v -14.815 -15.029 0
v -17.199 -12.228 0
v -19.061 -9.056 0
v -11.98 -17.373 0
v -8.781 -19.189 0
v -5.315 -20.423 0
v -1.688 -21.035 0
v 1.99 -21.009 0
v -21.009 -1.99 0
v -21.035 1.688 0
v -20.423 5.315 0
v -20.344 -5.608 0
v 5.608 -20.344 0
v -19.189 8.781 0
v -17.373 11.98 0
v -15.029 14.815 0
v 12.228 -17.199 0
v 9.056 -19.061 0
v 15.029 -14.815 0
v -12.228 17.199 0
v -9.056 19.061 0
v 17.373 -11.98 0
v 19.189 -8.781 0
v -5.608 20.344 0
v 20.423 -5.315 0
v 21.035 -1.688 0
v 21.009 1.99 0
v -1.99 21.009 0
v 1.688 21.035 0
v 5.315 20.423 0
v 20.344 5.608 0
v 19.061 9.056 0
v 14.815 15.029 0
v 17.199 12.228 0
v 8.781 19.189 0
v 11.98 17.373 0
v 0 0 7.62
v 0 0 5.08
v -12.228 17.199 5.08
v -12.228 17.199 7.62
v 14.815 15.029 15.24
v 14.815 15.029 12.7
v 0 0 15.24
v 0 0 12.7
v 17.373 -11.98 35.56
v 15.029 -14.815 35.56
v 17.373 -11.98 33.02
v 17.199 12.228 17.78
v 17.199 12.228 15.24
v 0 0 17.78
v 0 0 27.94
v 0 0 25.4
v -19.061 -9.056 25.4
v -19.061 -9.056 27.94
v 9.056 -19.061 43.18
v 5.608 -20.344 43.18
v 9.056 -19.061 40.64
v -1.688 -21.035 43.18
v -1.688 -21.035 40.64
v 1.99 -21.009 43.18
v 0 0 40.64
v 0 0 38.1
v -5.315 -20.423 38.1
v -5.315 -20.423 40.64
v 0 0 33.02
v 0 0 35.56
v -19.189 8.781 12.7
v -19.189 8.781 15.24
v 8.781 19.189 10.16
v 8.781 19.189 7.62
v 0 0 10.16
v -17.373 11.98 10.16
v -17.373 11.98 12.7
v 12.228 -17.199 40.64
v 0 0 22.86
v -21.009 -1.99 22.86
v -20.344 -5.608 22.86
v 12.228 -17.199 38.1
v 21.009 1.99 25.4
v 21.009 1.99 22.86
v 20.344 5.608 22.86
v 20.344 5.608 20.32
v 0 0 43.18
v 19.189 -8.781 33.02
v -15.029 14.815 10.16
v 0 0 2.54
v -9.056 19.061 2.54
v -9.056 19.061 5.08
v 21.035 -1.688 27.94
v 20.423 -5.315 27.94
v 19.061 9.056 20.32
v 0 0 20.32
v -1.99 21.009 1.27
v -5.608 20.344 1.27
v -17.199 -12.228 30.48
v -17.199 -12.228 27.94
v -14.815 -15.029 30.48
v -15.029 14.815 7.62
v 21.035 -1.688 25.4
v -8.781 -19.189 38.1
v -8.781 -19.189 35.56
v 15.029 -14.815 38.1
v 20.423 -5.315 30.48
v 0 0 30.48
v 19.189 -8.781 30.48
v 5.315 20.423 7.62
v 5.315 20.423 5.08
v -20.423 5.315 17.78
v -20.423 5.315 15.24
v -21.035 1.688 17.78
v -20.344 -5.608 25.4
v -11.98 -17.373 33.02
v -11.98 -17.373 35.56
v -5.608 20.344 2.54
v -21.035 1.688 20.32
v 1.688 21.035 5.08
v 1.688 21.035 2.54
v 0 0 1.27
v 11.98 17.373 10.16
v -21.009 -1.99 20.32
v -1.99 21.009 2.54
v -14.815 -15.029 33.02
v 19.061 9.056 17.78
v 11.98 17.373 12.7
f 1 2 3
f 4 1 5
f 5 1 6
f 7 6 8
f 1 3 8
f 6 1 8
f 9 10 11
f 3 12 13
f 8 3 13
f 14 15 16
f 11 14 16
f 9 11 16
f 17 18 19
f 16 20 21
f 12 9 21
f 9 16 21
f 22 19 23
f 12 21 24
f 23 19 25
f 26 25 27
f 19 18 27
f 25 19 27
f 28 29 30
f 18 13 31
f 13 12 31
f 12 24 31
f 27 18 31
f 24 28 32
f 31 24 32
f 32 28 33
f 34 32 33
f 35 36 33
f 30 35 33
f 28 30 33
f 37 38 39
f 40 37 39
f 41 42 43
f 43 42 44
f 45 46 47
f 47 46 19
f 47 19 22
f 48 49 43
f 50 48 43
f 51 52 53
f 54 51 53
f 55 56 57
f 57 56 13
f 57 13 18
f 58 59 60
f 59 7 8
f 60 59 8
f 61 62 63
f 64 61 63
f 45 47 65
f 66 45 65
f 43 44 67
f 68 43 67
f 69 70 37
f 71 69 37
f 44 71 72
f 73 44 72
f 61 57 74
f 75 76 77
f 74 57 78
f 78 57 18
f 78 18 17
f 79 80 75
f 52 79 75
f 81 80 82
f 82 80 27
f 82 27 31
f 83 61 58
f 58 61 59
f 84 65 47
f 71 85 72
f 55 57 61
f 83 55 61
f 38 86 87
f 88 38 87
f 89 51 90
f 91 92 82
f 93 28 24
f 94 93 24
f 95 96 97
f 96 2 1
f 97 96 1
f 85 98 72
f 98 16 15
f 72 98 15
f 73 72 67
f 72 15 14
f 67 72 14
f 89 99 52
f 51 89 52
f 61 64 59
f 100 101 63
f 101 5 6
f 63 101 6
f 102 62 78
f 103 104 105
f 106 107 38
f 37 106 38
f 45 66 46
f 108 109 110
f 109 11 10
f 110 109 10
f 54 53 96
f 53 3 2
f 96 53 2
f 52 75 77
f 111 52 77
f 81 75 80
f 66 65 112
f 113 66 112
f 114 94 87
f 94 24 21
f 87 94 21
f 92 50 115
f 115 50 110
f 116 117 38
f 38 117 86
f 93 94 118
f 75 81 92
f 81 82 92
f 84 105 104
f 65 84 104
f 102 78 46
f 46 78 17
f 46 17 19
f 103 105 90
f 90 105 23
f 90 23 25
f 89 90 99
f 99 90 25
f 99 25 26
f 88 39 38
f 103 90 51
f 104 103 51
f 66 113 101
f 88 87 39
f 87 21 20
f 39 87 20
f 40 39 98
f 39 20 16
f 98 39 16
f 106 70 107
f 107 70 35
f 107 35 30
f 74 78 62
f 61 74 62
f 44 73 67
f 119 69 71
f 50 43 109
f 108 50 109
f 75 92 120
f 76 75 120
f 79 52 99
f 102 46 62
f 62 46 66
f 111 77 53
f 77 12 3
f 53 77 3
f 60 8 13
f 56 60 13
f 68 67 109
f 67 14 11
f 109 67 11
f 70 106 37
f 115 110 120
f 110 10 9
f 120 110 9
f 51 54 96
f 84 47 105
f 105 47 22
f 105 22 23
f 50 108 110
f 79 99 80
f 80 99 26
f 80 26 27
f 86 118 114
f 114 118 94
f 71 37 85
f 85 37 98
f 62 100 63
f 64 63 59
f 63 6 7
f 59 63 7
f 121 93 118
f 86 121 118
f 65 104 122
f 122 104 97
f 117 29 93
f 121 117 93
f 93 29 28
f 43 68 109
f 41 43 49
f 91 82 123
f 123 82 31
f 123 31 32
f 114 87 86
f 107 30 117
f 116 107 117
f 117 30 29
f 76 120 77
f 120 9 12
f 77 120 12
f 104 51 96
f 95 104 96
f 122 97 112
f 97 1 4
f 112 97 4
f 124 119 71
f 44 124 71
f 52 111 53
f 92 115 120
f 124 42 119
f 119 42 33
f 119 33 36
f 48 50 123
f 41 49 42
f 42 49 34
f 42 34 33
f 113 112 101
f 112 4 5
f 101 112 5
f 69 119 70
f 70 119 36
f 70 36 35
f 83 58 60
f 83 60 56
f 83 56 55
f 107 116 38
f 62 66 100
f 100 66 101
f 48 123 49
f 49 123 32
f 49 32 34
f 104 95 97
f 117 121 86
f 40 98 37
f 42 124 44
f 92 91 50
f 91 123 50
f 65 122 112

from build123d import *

# Parameters (mm, degrees)
F1_DEPTH  = 2.54
F2_DEPTH  = 5.08
F3_DEPTH  = 7.62
F4_DEPTH  = 10.16
F5_DEPTH  = 12.7
F6_DEPTH  = 15.24
F7_DEPTH  = 17.78
F8_DEPTH  = 20.32
F9_DEPTH  = 22.86
F10_DEPTH = 25.4
F11_DEPTH = 27.94
F12_DEPTH = 30.48
F13_DEPTH = 33.02
F14_DEPTH = 35.56
F15_DEPTH = 38.1
F16_DEPTH = 40.64
F17_DEPTH = 43.18
F18_DEPTH = 43.18
F19_DEPTH = 43.18
F20_DEPTH = 40.64
F21_DEPTH = 38.1
F22_DEPTH = 35.56
F23_DEPTH = 33.02
F24_DEPTH = 30.48
F25_DEPTH = 27.94
F26_DEPTH = 25.4
F27_DEPTH = 22.86
F28_DEPTH = 20.32
F29_DEPTH = 17.78
F30_DEPTH = 15.24
F31_DEPTH = 12.7
F32_DEPTH = 10.16
F33_DEPTH = 7.62
F34_DEPTH = 5.08
F35_DEPTH = 2.54
F36_DEPTH = 1.27


with BuildPart() as f1:
    # F0 (on Top) → F1 (new body)
    with BuildSketch(Plane.XY):
        Polygon((-1.990034, 21.009007), (0, 0), (1.688375, 21.035399), align=None)
    extrude(amount=F1_DEPTH)

    # F0 (on Top) → F2 (join)
    with BuildSketch(Plane.XY):
        Polygon((1.688375, 21.035399), (0, 0), (5.315483, 20.422641), align=None)
    extrude(amount=F2_DEPTH)

    # F0 (on Top) → F3 (join)
    with BuildSketch(Plane.XY):
        Polygon((5.315483, 20.422641), (0, 0), (8.781084, 19.189351), align=None)
    extrude(amount=F3_DEPTH)

    # F0 (on Top) → F4 (join)
    with BuildSketch(Plane.XY):
        Polygon((8.781084, 19.189351), (0, 0), (11.979875, 17.373003), align=None)
    extrude(amount=F4_DEPTH)

    # F0 (on Top) → F5 (join)
    with BuildSketch(Plane.XY):
        Polygon((0, 0), (14.814664, 15.028784), (11.979875, 17.373003), align=None)
    extrude(amount=F5_DEPTH)

    # F0 (on Top) → F6 (join)
    with BuildSketch(Plane.XY):
        Polygon((0, 0), (17.199317, 12.227924), (14.814664, 15.028784), align=None)
    extrude(amount=F6_DEPTH)

    # F0 (on Top) → F7 (join)
    with BuildSketch(Plane.XY):
        Polygon((19.061377, 9.055524), (17.199317, 12.227924), (0, 0), align=None)
    extrude(amount=F7_DEPTH)

    # F0 (on Top) → F8 (join)
    with BuildSketch(Plane.XY):
        Polygon((20.344267, 5.607977), (19.061377, 9.055524), (0, 0), align=None)
    extrude(amount=F8_DEPTH)

    # F0 (on Top) → F9 (join)
    with BuildSketch(Plane.XY):
        Polygon((20.344267, 5.607977), (0, 0), (21.009007, 1.990034), align=None)
    extrude(amount=F9_DEPTH)

    # F0 (on Top) → F10 (join)
    with BuildSketch(Plane.XY):
        Polygon((21.009007, 1.990034), (0, 0), (21.035399, -1.688375), align=None)
    extrude(amount=F10_DEPTH)

    # F0 (on Top) → F11 (join)
    with BuildSketch(Plane.XY):
        Polygon((21.035399, -1.688375), (0, 0), (20.422641, -5.315483), align=None)
    extrude(amount=F11_DEPTH)

    # F0 (on Top) → F12 (join)
    with BuildSketch(Plane.XY):
        Polygon((20.422641, -5.315483), (0, 0), (19.189351, -8.781084), align=None)
    extrude(amount=F12_DEPTH)

    # F0 (on Top) → F13 (join)
    with BuildSketch(Plane.XY):
        Polygon((19.189351, -8.781084), (0, 0), (17.373003, -11.979875), align=None)
    extrude(amount=F13_DEPTH)

    # F0 (on Top) → F14 (join)
    with BuildSketch(Plane.XY):
        Polygon((17.373003, -11.979875), (0, 0), (15.028784, -14.814664), align=None)
    extrude(amount=F14_DEPTH)

    # F0 (on Top) → F15 (join)
    with BuildSketch(Plane.XY):
        Polygon((15.028784, -14.814664), (0, 0), (12.227924, -17.199317), align=None)
    extrude(amount=F15_DEPTH)

    # F0 (on Top) → F16 (join)
    with BuildSketch(Plane.XY):
        Polygon((12.227924, -17.199317), (0, 0), (9.055524, -19.061377), align=None)
    extrude(amount=F16_DEPTH)

    # F0 (on Top) → F17 (join)
    with BuildSketch(Plane.XY):
        Polygon((9.055524, -19.061377), (0, 0), (5.607977, -20.344267), align=None)
    extrude(amount=F17_DEPTH)

    # F0 (on Top) → F18 (join)
    with BuildSketch(Plane.XY):
        Polygon((5.607977, -20.344267), (0, 0), (1.990034, -21.009007), align=None)
    extrude(amount=F18_DEPTH)

    # F0 (on Top) → F19 (join)
    with BuildSketch(Plane.XY):
        Polygon((1.990034, -21.009007), (0, 0), (-1.688375, -21.035399), align=None)
    extrude(amount=F19_DEPTH)

    # F0 (on Top) → F20 (join)
    with BuildSketch(Plane.XY):
        Polygon((-1.688375, -21.035399), (0, 0), (-5.315483, -20.422641), align=None)
    extrude(amount=F20_DEPTH)

    # F0 (on Top) → F21 (join)
    with BuildSketch(Plane.XY):
        Polygon((-5.315483, -20.422641), (0, 0), (-8.781084, -19.189351), align=None)
    extrude(amount=F21_DEPTH)

    # F0 (on Top) → F22 (join)
    with BuildSketch(Plane.XY):
        Polygon((-8.781084, -19.189351), (0, 0), (-11.979875, -17.373003), align=None)
    extrude(amount=F22_DEPTH)

    # F0 (on Top) → F23 (join)
    with BuildSketch(Plane.XY):
        Polygon((-11.979875, -17.373003), (0, 0), (-14.814664, -15.028784), align=None)
    extrude(amount=F23_DEPTH)

    # F0 (on Top) → F24 (join)
    with BuildSketch(Plane.XY):
        Polygon((-14.814664, -15.028784), (0, 0), (-17.199317, -12.227924), align=None)
    extrude(amount=F24_DEPTH)

    # F0 (on Top) → F25 (join)
    with BuildSketch(Plane.XY):
        Polygon((-17.199317, -12.227924), (0, 0), (-19.061377, -9.055524), align=None)
    extrude(amount=F25_DEPTH)

    # F0 (on Top) → F26 (join)
    with BuildSketch(Plane.XY):
        Polygon((-19.061377, -9.055524), (0, 0), (-20.344267, -5.607977), align=None)
    extrude(amount=F26_DEPTH)

    # F0 (on Top) → F27 (join)
    with BuildSketch(Plane.XY):
        Polygon((-20.344267, -5.607977), (0, 0), (-21.009007, -1.990034), align=None)
    extrude(amount=F27_DEPTH)

    # F0 (on Top) → F28 (join)
    with BuildSketch(Plane.XY):
        Polygon((-21.009007, -1.990034), (0, 0), (-21.035399, 1.688375), align=None)
    extrude(amount=F28_DEPTH)

    # F0 (on Top) → F29 (join)
    with BuildSketch(Plane.XY):
        Polygon((-21.035399, 1.688375), (0, 0), (-20.422641, 5.315483), align=None)
    extrude(amount=F29_DEPTH)

    # F0 (on Top) → F30 (join)
    with BuildSketch(Plane.XY):
        Polygon((-20.422641, 5.315483), (0, 0), (-19.189351, 8.781084), align=None)
    extrude(amount=F30_DEPTH)

    # F0 (on Top) → F31 (join)
    with BuildSketch(Plane.XY):
        Polygon((-19.189351, 8.781084), (0, 0), (-17.373003, 11.979875), align=None)
    extrude(amount=F31_DEPTH)

    # F0 (on Top) → F32 (join)
    with BuildSketch(Plane.XY):
        Polygon((-17.373003, 11.979875), (0, 0), (-15.028784, 14.814664), align=None)
    extrude(amount=F32_DEPTH)

    # F0 (on Top) → F33 (join)
    with BuildSketch(Plane.XY):
        Polygon((-15.028784, 14.814664), (0, 0), (-12.227924, 17.199317), align=None)
    extrude(amount=F33_DEPTH)

    # F0 (on Top) → F34 (join)
    with BuildSketch(Plane.XY):
        Polygon((-12.227924, 17.199317), (0, 0), (-9.055524, 19.061377), align=None)
    extrude(amount=F34_DEPTH)

    # F0 (on Top) → F35 (join)
    with BuildSketch(Plane.XY):
        Polygon((-9.055524, 19.061377), (0, 0), (-5.607977, 20.344267), align=None)
    extrude(amount=F35_DEPTH)

    # F0 (on Top) → F36 (join)
    with BuildSketch(Plane.XY):
        Polygon((-5.607977, 20.344267), (0, 0), (-1.990034, 21.009007), align=None)
    extrude(amount=F36_DEPTH)


solid = f1.part
